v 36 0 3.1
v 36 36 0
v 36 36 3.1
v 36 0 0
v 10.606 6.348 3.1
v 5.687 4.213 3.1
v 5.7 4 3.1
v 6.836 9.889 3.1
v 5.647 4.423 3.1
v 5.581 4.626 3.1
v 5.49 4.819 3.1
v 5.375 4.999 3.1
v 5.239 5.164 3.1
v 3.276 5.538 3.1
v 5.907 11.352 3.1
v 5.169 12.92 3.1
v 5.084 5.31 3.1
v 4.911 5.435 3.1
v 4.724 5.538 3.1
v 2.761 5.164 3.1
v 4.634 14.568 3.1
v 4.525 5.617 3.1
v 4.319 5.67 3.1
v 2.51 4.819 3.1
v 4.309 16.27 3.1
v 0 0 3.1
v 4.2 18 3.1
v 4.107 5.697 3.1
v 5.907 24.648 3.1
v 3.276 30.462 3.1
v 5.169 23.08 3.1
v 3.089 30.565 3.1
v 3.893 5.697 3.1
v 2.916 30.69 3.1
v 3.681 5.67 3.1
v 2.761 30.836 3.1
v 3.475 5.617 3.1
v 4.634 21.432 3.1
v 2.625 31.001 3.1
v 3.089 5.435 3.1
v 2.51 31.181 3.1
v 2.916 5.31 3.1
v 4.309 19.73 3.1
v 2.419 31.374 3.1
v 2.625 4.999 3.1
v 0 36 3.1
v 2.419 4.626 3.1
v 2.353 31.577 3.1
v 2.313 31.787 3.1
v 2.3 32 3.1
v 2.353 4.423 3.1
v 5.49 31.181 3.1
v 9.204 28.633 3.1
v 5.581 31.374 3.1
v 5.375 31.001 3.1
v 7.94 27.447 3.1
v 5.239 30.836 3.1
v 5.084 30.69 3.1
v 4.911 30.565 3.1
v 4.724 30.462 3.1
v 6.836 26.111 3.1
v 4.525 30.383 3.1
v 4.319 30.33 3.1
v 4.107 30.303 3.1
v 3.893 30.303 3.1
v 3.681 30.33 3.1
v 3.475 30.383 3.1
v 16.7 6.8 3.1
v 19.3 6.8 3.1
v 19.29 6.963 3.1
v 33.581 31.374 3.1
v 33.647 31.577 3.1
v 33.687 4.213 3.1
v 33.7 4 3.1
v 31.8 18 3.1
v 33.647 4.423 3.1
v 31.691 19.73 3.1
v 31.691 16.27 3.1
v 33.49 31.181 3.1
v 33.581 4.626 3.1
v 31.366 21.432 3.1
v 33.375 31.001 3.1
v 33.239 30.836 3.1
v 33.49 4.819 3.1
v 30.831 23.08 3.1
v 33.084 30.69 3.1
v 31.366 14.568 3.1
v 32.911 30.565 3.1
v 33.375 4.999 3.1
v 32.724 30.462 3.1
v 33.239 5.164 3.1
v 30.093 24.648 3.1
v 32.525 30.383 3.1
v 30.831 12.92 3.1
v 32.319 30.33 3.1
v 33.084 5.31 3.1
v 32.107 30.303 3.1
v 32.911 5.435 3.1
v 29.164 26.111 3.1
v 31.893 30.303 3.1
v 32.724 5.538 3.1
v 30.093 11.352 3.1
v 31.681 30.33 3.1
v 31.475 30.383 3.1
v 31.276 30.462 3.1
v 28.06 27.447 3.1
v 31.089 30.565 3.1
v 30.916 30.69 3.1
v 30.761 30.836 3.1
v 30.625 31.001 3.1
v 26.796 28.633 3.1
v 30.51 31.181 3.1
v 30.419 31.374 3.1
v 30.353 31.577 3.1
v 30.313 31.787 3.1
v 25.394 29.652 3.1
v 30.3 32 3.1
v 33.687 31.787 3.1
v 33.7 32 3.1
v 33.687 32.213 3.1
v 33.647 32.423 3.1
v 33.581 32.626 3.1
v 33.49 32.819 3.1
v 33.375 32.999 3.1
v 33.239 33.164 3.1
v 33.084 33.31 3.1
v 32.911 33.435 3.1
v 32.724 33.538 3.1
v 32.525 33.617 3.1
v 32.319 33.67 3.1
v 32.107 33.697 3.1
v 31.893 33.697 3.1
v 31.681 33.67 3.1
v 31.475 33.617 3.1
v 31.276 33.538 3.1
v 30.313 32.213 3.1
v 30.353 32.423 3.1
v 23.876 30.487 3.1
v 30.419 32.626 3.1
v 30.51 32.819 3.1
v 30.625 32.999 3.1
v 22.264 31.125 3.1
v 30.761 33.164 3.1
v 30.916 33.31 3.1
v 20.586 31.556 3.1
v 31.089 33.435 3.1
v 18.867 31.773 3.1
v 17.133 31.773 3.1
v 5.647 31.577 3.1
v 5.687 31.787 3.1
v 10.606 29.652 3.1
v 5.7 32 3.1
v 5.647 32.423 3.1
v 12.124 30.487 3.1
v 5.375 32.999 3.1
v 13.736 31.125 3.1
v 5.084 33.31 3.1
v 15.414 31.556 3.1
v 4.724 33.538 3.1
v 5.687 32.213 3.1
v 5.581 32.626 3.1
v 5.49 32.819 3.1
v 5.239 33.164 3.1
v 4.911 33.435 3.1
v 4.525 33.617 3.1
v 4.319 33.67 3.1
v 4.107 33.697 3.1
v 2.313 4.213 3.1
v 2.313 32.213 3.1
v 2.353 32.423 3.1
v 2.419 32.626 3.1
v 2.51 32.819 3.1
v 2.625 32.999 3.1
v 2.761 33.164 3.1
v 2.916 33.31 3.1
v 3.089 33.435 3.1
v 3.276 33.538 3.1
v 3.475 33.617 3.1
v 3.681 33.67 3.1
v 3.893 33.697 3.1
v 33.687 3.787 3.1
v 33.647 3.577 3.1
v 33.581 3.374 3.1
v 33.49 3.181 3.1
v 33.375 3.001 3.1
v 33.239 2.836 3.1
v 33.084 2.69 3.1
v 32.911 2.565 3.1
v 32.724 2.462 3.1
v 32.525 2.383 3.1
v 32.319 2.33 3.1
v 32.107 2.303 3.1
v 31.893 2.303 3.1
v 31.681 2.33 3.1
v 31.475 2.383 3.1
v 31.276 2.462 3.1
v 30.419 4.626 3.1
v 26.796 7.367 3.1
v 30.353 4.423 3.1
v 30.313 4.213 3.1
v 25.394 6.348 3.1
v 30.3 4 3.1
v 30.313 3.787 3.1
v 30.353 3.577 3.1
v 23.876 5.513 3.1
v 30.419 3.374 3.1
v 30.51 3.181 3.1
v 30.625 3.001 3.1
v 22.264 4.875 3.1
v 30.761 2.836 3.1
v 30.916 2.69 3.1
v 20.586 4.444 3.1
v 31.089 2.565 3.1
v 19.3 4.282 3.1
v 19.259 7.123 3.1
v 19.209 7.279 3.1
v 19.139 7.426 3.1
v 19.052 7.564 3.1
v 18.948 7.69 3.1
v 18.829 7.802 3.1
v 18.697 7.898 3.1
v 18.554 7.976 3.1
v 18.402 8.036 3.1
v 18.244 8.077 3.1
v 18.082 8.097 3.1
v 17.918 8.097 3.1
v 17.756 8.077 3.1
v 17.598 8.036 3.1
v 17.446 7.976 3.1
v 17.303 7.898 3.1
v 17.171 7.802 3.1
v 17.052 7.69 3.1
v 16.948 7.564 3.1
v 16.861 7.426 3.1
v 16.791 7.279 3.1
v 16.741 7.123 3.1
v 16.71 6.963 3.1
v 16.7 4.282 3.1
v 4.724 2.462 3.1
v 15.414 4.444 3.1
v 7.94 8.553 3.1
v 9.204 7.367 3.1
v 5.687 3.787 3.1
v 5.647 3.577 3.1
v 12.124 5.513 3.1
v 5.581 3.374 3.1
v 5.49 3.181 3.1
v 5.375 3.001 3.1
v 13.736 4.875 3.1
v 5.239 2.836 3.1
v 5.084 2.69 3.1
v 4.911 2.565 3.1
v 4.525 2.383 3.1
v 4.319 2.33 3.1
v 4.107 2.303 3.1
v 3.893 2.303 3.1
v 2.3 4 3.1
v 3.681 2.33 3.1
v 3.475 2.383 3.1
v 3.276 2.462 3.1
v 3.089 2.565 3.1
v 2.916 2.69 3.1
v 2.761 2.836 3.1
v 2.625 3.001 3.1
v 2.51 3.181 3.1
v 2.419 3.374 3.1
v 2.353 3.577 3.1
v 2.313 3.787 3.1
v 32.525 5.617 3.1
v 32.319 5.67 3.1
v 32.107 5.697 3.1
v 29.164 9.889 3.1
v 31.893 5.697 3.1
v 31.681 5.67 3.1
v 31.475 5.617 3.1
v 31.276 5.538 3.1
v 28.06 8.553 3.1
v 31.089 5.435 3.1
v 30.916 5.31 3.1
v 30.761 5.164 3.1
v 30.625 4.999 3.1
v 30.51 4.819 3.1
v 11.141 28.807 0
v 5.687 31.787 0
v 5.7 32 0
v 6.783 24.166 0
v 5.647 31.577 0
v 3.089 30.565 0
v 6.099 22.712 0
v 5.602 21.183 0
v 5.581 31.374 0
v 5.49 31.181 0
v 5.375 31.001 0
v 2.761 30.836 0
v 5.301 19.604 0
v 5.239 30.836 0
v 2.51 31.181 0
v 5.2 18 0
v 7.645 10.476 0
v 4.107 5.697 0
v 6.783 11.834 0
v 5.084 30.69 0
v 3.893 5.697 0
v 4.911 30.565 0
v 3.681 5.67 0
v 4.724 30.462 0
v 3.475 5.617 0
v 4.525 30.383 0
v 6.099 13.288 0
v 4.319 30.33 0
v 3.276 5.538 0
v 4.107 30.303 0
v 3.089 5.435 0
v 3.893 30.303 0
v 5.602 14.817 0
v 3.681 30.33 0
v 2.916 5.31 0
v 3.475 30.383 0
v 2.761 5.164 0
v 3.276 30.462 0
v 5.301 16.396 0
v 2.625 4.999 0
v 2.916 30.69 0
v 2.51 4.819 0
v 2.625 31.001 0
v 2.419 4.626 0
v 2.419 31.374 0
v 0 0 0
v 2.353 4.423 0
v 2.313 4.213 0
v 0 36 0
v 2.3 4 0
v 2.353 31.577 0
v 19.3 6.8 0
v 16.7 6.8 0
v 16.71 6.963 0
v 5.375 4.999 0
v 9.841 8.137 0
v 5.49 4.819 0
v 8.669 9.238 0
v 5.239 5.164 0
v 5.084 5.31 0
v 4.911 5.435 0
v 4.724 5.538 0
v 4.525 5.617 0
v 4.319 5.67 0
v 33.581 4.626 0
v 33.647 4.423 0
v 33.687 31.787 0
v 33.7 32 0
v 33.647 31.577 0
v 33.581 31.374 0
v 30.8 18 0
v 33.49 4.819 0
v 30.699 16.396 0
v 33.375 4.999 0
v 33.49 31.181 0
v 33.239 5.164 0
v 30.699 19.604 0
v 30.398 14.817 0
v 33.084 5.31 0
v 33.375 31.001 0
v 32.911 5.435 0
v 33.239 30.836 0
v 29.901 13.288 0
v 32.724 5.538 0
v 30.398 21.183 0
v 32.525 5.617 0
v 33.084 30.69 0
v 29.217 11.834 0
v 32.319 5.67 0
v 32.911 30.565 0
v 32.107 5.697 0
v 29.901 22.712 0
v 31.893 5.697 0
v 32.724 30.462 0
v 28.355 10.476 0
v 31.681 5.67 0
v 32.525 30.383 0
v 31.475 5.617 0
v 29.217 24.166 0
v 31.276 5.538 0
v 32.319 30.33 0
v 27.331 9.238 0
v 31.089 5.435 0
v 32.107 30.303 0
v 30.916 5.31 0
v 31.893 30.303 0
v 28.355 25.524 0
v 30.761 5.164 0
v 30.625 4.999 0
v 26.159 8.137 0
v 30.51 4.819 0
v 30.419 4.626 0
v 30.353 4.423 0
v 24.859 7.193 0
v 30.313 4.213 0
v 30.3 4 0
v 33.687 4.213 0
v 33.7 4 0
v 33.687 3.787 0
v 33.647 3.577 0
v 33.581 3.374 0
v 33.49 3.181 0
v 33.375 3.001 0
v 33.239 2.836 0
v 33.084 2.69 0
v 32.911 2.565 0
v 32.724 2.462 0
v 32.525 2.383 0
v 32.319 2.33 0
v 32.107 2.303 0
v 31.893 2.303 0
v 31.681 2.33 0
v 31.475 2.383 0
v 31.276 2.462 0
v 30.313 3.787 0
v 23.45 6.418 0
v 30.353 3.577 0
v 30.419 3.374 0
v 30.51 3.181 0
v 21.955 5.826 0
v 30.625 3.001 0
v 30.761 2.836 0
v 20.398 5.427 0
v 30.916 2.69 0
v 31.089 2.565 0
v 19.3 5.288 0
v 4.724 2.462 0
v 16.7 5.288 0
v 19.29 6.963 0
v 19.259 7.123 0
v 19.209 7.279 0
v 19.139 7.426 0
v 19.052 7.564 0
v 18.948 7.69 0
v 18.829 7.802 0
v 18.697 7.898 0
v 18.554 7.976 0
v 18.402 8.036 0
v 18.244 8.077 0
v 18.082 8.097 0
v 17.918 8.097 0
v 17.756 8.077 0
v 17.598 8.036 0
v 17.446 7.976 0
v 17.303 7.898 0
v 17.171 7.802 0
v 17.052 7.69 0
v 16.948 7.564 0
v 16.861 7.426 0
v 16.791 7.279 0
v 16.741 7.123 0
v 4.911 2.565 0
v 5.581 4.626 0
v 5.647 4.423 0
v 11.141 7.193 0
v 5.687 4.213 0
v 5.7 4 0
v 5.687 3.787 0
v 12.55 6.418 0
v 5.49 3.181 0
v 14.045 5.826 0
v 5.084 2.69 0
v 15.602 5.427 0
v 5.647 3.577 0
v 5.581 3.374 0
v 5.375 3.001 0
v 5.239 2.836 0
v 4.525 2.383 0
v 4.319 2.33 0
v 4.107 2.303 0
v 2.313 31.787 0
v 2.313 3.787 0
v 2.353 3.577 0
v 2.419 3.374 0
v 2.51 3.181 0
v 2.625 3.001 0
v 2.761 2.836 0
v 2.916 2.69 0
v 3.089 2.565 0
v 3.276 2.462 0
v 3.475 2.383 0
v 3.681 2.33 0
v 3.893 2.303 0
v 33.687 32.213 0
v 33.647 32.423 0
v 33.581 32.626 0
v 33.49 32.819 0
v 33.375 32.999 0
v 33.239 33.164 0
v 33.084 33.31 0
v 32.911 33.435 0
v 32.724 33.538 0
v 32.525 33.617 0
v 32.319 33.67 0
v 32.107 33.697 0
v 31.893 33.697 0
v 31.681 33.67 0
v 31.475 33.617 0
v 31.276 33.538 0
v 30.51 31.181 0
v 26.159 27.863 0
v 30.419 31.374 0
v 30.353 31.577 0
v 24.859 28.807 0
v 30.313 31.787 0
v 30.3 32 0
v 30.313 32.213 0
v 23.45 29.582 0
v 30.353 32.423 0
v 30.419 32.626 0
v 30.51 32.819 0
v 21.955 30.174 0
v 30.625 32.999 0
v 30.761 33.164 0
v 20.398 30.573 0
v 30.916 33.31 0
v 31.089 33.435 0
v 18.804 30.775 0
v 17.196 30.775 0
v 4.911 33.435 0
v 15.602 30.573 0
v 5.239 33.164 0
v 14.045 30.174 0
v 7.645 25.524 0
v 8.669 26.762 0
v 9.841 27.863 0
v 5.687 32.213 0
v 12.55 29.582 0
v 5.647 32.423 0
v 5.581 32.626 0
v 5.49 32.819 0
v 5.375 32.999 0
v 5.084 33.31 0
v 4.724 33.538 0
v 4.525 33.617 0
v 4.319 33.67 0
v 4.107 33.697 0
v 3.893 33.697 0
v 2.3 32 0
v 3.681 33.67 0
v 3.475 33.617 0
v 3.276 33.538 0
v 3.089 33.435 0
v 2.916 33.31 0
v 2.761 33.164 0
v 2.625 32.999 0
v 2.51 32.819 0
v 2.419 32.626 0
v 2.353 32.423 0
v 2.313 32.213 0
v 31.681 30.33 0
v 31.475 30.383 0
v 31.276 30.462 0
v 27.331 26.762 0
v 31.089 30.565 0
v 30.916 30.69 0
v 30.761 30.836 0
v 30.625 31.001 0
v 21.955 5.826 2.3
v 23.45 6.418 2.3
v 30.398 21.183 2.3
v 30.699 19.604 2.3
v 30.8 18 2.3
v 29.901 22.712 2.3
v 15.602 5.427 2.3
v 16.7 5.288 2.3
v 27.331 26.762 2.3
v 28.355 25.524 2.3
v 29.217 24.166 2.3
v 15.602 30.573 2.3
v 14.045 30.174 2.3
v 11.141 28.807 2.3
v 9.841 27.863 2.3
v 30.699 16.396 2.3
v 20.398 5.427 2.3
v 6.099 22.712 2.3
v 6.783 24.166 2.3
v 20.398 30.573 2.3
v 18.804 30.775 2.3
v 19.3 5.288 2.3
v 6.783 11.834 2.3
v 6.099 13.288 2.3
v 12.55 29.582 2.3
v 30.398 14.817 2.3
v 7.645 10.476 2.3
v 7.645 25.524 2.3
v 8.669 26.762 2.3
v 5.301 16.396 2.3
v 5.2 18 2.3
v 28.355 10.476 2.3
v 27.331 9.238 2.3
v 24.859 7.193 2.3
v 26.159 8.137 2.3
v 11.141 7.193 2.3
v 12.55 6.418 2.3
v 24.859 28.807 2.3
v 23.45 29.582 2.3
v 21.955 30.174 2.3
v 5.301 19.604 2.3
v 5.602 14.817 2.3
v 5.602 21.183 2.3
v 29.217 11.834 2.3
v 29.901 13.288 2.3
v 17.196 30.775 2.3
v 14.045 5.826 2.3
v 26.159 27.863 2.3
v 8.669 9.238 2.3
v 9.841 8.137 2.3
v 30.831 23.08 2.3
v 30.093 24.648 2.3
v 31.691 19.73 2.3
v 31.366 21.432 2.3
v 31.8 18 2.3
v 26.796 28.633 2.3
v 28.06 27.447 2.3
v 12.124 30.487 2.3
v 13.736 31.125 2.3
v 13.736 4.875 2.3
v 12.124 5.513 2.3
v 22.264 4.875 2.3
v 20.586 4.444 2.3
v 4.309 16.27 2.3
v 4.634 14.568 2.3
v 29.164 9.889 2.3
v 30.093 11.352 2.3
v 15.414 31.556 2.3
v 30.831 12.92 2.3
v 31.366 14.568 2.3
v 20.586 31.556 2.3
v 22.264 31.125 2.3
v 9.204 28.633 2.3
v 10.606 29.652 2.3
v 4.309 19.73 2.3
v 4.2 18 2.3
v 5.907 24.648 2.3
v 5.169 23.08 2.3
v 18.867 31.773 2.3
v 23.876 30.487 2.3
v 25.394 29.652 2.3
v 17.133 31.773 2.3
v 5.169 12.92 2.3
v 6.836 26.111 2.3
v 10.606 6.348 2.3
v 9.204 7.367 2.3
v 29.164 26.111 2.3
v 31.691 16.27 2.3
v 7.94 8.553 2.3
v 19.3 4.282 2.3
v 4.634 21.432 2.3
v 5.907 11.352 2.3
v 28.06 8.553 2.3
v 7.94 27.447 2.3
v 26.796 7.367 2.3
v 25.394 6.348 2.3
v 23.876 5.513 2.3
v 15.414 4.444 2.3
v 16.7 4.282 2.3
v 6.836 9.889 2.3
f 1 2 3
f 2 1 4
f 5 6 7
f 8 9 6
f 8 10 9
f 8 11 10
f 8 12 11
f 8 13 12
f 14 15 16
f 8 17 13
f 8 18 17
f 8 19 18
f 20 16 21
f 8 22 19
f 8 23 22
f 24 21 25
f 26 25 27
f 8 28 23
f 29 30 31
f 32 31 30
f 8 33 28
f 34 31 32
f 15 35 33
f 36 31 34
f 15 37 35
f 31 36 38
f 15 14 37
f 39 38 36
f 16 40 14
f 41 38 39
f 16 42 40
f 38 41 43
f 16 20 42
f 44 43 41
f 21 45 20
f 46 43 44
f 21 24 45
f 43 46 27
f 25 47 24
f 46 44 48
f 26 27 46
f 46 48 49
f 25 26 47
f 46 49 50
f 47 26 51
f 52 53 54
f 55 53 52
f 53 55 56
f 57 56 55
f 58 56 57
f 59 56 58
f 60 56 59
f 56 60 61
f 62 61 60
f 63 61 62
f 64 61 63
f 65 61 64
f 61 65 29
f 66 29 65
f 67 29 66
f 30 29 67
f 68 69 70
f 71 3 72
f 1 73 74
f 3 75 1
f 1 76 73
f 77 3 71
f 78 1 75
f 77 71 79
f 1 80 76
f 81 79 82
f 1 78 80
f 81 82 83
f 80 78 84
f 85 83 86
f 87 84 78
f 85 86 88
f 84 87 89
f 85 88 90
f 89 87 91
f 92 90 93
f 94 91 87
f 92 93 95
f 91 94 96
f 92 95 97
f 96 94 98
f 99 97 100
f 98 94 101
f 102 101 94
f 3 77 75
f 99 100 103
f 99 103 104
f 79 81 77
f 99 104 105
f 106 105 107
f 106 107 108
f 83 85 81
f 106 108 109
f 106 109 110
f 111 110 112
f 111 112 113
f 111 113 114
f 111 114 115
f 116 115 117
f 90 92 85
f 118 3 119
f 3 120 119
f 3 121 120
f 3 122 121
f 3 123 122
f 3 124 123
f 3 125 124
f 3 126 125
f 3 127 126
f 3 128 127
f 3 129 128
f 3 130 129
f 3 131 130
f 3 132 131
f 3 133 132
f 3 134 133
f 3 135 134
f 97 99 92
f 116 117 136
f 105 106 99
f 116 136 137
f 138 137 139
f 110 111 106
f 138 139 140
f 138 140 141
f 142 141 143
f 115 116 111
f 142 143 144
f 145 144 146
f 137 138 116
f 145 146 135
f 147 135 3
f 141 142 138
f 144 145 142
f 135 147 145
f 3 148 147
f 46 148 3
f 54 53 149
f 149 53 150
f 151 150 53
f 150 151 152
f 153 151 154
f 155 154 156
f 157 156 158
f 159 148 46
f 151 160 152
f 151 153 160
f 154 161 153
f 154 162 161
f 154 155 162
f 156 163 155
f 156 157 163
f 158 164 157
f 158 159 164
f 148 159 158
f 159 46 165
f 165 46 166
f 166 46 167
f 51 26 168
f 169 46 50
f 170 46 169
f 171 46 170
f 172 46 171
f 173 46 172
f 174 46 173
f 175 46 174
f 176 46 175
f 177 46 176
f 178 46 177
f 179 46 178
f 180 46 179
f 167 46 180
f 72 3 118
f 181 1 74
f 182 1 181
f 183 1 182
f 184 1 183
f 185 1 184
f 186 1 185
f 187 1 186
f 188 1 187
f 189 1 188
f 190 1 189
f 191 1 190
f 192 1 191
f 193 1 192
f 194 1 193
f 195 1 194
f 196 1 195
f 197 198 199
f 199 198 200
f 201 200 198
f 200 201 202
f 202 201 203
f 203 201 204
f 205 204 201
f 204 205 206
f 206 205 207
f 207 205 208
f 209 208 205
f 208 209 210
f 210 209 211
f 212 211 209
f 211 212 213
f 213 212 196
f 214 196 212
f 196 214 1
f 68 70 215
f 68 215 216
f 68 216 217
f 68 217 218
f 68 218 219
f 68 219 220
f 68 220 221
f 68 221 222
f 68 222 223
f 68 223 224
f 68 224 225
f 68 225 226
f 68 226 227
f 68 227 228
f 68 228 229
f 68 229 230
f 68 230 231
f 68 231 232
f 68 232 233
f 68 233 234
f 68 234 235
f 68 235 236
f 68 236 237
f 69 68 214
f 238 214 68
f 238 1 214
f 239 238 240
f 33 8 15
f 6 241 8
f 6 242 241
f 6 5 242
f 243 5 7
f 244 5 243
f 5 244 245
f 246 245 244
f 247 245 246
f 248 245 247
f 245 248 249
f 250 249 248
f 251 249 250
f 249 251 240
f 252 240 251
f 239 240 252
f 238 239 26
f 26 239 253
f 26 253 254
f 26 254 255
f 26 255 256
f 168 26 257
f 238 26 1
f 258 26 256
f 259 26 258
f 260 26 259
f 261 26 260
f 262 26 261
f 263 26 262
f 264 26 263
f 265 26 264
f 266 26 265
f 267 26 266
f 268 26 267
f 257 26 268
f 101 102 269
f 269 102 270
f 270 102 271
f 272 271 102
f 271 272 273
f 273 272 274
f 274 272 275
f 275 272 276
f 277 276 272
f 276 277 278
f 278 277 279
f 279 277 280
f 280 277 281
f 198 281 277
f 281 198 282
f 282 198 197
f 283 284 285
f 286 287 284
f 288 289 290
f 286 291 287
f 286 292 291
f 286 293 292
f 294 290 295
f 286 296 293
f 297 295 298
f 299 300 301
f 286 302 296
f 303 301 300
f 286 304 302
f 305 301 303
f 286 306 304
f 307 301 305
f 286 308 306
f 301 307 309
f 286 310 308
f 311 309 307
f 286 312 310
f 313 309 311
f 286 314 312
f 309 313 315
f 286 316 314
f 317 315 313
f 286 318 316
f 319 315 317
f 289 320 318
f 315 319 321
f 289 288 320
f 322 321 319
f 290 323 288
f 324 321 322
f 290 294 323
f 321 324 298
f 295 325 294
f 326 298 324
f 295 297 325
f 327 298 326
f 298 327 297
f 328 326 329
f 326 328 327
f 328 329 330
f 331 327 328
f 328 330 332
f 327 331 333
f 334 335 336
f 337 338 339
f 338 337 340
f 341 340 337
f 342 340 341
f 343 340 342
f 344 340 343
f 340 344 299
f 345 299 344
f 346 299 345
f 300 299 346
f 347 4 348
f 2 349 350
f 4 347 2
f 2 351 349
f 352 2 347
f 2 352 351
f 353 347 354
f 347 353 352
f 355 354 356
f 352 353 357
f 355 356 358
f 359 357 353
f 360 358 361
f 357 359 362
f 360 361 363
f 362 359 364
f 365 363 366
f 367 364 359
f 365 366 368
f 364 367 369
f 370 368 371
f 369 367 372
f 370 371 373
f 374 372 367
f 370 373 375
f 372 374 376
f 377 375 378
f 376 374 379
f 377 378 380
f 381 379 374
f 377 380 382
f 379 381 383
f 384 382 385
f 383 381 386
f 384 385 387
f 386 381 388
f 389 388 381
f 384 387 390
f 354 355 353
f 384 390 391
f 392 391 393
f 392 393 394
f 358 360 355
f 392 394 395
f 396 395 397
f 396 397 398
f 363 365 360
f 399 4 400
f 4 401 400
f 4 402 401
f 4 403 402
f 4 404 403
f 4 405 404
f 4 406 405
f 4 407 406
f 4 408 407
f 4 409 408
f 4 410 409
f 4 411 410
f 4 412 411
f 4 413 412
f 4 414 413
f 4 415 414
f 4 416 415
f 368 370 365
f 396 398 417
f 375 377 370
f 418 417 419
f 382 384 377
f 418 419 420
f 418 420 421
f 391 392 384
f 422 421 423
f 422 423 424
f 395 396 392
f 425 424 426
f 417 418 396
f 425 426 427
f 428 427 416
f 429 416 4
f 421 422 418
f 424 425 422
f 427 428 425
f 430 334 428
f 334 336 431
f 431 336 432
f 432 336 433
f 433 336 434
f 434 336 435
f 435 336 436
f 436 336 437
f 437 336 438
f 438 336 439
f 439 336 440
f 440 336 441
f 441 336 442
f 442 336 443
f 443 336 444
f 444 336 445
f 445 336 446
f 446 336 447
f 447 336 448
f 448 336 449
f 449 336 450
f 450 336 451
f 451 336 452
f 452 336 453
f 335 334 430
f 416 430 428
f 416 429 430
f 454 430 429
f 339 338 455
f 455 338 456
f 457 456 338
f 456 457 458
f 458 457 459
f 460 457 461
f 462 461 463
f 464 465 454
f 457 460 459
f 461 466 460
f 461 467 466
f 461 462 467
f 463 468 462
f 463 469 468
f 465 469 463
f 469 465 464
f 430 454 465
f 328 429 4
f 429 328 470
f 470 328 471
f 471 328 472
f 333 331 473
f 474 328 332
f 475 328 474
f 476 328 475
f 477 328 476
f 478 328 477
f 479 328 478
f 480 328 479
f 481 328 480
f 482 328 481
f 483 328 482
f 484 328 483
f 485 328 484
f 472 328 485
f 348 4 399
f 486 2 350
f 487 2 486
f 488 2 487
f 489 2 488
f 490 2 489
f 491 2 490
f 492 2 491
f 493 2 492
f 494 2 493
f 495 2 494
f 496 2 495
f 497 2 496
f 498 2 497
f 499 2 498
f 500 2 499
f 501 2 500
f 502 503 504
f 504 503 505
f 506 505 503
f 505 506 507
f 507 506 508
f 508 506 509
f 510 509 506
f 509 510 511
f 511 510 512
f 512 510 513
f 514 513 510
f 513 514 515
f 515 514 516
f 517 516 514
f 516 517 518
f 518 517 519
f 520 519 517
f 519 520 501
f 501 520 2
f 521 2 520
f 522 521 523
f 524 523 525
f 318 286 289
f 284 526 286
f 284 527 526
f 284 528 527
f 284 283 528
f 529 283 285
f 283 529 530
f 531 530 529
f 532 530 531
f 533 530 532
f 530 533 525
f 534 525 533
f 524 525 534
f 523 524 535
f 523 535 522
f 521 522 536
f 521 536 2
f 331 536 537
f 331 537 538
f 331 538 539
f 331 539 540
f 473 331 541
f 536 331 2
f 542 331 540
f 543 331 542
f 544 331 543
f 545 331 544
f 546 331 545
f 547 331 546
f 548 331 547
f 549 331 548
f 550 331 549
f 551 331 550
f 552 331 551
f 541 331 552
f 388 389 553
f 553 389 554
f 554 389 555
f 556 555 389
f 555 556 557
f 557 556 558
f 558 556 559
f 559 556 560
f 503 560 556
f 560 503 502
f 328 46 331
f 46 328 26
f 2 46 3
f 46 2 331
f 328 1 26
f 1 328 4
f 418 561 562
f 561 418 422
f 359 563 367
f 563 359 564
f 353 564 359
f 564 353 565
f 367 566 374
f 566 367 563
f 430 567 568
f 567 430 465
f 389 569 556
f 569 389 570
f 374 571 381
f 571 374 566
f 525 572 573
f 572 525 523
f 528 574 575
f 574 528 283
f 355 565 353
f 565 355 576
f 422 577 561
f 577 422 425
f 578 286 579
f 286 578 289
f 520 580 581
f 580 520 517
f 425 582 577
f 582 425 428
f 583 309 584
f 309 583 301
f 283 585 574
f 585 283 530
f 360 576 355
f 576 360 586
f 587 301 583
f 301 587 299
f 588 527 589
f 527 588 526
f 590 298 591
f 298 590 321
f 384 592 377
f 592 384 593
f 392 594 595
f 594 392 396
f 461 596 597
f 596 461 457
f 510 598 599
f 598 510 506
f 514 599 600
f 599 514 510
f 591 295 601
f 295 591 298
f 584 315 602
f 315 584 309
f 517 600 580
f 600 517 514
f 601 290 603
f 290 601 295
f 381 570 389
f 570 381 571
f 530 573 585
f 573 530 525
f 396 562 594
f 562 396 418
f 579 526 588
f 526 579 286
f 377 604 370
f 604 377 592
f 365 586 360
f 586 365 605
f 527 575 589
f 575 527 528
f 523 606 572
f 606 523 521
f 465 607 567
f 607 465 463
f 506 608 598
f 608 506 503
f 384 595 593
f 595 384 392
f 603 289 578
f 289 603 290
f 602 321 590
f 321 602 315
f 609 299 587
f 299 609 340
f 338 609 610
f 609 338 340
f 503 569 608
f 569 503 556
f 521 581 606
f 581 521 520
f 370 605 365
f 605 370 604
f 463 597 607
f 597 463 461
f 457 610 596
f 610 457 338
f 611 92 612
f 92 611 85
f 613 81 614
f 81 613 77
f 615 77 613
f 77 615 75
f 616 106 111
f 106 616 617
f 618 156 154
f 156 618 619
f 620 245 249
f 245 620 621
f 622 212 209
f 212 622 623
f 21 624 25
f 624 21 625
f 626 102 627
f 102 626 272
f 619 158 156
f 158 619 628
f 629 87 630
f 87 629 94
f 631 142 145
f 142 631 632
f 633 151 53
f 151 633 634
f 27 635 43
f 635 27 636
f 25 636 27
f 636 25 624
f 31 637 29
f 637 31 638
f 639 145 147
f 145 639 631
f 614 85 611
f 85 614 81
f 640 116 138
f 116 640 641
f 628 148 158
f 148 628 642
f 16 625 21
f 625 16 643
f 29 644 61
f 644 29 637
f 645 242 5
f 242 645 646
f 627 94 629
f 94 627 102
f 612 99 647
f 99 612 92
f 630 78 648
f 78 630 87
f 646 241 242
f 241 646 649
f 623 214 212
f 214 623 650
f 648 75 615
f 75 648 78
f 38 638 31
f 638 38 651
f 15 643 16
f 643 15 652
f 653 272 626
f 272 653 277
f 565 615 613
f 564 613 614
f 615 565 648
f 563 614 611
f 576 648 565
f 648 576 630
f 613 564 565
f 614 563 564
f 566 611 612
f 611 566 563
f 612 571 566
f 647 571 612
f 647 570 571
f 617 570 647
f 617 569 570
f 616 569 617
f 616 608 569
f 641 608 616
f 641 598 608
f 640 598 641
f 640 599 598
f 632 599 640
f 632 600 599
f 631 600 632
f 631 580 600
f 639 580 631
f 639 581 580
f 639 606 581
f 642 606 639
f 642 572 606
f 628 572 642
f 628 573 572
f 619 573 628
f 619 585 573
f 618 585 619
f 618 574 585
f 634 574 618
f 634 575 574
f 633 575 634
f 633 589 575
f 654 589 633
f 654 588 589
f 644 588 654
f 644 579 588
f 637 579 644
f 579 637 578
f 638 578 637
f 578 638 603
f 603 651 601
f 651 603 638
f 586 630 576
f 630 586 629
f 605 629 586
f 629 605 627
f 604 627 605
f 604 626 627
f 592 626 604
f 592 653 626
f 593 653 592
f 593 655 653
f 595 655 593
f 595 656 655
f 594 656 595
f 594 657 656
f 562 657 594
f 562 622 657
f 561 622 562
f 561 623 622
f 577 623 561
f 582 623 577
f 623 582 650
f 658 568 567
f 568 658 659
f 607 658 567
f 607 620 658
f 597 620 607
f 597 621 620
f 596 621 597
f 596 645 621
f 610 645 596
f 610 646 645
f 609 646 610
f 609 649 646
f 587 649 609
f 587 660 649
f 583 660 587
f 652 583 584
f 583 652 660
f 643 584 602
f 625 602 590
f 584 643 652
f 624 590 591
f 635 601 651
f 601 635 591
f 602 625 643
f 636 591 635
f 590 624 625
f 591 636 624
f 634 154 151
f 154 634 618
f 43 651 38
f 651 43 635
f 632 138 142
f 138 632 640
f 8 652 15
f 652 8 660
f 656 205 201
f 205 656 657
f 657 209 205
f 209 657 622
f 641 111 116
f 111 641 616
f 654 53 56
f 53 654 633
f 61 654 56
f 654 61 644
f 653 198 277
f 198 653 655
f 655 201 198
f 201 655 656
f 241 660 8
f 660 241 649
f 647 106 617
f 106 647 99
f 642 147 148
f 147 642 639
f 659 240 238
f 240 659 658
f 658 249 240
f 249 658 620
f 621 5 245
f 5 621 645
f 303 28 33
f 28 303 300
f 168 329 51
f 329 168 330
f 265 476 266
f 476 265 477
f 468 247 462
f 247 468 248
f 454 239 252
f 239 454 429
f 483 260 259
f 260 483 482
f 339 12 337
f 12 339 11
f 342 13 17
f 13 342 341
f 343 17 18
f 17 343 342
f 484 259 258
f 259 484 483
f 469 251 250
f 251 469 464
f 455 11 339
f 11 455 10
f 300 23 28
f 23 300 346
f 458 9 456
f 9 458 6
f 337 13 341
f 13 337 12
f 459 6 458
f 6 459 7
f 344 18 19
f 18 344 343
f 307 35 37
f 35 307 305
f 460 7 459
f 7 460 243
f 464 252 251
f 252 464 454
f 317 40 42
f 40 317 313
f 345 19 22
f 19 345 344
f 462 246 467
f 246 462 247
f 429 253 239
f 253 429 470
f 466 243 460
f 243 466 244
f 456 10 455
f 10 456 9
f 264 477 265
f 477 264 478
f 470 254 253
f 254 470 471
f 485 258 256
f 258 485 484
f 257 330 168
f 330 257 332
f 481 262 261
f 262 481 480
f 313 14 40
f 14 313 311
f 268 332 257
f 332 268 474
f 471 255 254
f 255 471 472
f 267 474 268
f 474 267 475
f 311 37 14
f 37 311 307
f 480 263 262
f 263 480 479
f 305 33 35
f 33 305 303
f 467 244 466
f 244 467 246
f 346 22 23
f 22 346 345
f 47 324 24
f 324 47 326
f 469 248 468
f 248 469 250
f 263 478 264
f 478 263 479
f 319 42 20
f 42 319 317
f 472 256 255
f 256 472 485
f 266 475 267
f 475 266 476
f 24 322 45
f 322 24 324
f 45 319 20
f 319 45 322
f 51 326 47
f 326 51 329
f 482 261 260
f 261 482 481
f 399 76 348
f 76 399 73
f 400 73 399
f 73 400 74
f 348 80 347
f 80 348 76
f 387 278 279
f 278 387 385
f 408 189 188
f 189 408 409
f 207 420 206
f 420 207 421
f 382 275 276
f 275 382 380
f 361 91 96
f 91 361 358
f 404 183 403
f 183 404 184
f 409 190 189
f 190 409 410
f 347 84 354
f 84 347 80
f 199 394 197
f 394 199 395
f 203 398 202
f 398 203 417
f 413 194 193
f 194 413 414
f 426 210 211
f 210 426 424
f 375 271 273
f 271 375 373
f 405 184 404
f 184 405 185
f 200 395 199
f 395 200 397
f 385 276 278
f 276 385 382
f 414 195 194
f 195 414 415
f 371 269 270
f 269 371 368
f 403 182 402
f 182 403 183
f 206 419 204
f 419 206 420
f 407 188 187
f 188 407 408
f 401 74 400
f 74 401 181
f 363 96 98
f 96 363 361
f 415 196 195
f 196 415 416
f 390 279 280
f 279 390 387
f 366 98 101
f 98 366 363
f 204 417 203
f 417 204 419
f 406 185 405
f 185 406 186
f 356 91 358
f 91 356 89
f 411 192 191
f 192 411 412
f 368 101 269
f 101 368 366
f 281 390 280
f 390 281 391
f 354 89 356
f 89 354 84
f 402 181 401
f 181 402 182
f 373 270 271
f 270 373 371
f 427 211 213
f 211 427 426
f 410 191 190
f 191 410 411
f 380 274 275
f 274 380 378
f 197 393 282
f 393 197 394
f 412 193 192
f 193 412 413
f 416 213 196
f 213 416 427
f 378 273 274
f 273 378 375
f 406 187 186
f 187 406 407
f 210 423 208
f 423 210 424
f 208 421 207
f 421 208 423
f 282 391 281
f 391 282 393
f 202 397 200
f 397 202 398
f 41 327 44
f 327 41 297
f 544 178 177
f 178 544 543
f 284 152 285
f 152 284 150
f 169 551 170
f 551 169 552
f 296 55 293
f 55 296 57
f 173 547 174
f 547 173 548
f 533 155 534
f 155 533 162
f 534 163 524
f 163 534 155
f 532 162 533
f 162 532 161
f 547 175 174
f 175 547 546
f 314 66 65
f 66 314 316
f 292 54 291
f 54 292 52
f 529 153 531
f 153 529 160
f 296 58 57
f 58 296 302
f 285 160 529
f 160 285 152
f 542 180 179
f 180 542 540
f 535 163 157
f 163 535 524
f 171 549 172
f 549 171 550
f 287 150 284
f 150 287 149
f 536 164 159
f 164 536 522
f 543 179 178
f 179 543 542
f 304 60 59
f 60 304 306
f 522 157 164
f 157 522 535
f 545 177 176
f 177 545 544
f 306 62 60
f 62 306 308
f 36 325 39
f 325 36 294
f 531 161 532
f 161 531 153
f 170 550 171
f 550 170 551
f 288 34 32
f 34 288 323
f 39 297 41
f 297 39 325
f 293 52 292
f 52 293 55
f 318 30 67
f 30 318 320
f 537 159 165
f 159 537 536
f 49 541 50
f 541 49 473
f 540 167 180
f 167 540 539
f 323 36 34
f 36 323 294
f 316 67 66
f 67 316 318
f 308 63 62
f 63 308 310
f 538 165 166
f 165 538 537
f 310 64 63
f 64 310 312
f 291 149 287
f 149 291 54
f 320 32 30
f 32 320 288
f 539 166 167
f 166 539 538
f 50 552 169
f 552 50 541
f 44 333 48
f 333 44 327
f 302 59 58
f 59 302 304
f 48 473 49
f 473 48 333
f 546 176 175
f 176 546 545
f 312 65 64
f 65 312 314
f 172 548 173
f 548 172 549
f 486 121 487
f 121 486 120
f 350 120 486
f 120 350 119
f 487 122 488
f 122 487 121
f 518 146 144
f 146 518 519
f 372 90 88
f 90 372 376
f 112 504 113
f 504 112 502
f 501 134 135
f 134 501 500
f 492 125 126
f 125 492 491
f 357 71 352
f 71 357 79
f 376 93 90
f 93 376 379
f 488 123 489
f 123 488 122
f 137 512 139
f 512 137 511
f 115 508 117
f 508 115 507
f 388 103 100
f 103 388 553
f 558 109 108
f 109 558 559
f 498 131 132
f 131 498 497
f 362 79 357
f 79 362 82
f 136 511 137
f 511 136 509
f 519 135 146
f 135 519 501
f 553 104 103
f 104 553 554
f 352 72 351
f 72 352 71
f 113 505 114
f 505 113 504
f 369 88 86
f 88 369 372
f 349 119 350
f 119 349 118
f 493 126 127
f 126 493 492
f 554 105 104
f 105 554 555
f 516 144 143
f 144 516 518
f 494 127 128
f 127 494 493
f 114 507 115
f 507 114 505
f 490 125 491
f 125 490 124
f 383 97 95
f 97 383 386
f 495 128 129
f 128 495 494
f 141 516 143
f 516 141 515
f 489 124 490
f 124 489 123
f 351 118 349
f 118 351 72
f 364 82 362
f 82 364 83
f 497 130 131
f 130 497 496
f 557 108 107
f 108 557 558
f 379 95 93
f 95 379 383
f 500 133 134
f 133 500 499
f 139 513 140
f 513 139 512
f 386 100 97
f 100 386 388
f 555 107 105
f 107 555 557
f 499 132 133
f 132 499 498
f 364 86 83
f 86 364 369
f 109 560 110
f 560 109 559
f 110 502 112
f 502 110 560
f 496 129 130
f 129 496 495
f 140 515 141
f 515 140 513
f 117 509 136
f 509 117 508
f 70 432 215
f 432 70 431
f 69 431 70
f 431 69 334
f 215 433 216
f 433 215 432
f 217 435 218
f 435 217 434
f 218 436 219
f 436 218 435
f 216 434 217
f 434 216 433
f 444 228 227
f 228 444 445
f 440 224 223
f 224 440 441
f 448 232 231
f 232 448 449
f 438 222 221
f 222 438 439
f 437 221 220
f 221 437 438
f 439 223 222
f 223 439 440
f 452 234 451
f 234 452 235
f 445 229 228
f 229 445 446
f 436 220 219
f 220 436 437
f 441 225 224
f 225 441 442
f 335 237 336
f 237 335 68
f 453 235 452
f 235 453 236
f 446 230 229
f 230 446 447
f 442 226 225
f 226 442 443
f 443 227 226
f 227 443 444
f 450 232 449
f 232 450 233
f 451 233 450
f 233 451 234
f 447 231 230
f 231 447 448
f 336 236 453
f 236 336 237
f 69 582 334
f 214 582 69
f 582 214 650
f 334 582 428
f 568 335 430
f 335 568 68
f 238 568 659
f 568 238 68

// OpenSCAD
$fn=50;

//COB LED holder
dHolder=36;
hHolder=3.1; // Adjust for first layer  h=0.3mm
dCOB=27.6; // Specified size =26mm but actually a bit bigger
rCOB=dCOB/2;
dRetain=dCOB-2;

rRetain=dRetain/2;
hCOB=0.8; 
adjust=2.6; // To adjust the position of the notch

dNotch=2.6;
yNotch=dHolder/2-rCOB+adjust;

dHole=3.4; //Mounting hole for M3 screw
pHole=4; //Mount hole distance from the edge

difference () {
cube([dHolder,dHolder,hHolder]);
    translate([dHolder/2,dHolder/2,0]){
        cylinder(h=hHolder,d=dRetain);
    }
    translate([dHolder/2,dHolder/2,hHolder-hCOB]){    
    cylinder(h=hCOB,d=dCOB);
    }
    translate([pHole,pHole,0]){cylinder(h=hHolder,d=dHole);}
    translate([dHolder-pHole,pHole,0]){cylinder(h=hHolder,d=dHole);}
    translate([pHole,dHolder-pHole,0]){cylinder(h=hHolder,d=dHole);}
    translate([dHolder-pHole,dHolder-pHole,0]){cylinder(h=hHolder,d=dHole);}
  }
translate([dHolder/2,dHolder/2-rCOB+adjust,0]) {
    cylinder(h=hHolder,d=dNotch);
    }
translate([dHolder/2-dNotch/2,0,0]) {    
    cube([dNotch,yNotch,hHolder]);
}
